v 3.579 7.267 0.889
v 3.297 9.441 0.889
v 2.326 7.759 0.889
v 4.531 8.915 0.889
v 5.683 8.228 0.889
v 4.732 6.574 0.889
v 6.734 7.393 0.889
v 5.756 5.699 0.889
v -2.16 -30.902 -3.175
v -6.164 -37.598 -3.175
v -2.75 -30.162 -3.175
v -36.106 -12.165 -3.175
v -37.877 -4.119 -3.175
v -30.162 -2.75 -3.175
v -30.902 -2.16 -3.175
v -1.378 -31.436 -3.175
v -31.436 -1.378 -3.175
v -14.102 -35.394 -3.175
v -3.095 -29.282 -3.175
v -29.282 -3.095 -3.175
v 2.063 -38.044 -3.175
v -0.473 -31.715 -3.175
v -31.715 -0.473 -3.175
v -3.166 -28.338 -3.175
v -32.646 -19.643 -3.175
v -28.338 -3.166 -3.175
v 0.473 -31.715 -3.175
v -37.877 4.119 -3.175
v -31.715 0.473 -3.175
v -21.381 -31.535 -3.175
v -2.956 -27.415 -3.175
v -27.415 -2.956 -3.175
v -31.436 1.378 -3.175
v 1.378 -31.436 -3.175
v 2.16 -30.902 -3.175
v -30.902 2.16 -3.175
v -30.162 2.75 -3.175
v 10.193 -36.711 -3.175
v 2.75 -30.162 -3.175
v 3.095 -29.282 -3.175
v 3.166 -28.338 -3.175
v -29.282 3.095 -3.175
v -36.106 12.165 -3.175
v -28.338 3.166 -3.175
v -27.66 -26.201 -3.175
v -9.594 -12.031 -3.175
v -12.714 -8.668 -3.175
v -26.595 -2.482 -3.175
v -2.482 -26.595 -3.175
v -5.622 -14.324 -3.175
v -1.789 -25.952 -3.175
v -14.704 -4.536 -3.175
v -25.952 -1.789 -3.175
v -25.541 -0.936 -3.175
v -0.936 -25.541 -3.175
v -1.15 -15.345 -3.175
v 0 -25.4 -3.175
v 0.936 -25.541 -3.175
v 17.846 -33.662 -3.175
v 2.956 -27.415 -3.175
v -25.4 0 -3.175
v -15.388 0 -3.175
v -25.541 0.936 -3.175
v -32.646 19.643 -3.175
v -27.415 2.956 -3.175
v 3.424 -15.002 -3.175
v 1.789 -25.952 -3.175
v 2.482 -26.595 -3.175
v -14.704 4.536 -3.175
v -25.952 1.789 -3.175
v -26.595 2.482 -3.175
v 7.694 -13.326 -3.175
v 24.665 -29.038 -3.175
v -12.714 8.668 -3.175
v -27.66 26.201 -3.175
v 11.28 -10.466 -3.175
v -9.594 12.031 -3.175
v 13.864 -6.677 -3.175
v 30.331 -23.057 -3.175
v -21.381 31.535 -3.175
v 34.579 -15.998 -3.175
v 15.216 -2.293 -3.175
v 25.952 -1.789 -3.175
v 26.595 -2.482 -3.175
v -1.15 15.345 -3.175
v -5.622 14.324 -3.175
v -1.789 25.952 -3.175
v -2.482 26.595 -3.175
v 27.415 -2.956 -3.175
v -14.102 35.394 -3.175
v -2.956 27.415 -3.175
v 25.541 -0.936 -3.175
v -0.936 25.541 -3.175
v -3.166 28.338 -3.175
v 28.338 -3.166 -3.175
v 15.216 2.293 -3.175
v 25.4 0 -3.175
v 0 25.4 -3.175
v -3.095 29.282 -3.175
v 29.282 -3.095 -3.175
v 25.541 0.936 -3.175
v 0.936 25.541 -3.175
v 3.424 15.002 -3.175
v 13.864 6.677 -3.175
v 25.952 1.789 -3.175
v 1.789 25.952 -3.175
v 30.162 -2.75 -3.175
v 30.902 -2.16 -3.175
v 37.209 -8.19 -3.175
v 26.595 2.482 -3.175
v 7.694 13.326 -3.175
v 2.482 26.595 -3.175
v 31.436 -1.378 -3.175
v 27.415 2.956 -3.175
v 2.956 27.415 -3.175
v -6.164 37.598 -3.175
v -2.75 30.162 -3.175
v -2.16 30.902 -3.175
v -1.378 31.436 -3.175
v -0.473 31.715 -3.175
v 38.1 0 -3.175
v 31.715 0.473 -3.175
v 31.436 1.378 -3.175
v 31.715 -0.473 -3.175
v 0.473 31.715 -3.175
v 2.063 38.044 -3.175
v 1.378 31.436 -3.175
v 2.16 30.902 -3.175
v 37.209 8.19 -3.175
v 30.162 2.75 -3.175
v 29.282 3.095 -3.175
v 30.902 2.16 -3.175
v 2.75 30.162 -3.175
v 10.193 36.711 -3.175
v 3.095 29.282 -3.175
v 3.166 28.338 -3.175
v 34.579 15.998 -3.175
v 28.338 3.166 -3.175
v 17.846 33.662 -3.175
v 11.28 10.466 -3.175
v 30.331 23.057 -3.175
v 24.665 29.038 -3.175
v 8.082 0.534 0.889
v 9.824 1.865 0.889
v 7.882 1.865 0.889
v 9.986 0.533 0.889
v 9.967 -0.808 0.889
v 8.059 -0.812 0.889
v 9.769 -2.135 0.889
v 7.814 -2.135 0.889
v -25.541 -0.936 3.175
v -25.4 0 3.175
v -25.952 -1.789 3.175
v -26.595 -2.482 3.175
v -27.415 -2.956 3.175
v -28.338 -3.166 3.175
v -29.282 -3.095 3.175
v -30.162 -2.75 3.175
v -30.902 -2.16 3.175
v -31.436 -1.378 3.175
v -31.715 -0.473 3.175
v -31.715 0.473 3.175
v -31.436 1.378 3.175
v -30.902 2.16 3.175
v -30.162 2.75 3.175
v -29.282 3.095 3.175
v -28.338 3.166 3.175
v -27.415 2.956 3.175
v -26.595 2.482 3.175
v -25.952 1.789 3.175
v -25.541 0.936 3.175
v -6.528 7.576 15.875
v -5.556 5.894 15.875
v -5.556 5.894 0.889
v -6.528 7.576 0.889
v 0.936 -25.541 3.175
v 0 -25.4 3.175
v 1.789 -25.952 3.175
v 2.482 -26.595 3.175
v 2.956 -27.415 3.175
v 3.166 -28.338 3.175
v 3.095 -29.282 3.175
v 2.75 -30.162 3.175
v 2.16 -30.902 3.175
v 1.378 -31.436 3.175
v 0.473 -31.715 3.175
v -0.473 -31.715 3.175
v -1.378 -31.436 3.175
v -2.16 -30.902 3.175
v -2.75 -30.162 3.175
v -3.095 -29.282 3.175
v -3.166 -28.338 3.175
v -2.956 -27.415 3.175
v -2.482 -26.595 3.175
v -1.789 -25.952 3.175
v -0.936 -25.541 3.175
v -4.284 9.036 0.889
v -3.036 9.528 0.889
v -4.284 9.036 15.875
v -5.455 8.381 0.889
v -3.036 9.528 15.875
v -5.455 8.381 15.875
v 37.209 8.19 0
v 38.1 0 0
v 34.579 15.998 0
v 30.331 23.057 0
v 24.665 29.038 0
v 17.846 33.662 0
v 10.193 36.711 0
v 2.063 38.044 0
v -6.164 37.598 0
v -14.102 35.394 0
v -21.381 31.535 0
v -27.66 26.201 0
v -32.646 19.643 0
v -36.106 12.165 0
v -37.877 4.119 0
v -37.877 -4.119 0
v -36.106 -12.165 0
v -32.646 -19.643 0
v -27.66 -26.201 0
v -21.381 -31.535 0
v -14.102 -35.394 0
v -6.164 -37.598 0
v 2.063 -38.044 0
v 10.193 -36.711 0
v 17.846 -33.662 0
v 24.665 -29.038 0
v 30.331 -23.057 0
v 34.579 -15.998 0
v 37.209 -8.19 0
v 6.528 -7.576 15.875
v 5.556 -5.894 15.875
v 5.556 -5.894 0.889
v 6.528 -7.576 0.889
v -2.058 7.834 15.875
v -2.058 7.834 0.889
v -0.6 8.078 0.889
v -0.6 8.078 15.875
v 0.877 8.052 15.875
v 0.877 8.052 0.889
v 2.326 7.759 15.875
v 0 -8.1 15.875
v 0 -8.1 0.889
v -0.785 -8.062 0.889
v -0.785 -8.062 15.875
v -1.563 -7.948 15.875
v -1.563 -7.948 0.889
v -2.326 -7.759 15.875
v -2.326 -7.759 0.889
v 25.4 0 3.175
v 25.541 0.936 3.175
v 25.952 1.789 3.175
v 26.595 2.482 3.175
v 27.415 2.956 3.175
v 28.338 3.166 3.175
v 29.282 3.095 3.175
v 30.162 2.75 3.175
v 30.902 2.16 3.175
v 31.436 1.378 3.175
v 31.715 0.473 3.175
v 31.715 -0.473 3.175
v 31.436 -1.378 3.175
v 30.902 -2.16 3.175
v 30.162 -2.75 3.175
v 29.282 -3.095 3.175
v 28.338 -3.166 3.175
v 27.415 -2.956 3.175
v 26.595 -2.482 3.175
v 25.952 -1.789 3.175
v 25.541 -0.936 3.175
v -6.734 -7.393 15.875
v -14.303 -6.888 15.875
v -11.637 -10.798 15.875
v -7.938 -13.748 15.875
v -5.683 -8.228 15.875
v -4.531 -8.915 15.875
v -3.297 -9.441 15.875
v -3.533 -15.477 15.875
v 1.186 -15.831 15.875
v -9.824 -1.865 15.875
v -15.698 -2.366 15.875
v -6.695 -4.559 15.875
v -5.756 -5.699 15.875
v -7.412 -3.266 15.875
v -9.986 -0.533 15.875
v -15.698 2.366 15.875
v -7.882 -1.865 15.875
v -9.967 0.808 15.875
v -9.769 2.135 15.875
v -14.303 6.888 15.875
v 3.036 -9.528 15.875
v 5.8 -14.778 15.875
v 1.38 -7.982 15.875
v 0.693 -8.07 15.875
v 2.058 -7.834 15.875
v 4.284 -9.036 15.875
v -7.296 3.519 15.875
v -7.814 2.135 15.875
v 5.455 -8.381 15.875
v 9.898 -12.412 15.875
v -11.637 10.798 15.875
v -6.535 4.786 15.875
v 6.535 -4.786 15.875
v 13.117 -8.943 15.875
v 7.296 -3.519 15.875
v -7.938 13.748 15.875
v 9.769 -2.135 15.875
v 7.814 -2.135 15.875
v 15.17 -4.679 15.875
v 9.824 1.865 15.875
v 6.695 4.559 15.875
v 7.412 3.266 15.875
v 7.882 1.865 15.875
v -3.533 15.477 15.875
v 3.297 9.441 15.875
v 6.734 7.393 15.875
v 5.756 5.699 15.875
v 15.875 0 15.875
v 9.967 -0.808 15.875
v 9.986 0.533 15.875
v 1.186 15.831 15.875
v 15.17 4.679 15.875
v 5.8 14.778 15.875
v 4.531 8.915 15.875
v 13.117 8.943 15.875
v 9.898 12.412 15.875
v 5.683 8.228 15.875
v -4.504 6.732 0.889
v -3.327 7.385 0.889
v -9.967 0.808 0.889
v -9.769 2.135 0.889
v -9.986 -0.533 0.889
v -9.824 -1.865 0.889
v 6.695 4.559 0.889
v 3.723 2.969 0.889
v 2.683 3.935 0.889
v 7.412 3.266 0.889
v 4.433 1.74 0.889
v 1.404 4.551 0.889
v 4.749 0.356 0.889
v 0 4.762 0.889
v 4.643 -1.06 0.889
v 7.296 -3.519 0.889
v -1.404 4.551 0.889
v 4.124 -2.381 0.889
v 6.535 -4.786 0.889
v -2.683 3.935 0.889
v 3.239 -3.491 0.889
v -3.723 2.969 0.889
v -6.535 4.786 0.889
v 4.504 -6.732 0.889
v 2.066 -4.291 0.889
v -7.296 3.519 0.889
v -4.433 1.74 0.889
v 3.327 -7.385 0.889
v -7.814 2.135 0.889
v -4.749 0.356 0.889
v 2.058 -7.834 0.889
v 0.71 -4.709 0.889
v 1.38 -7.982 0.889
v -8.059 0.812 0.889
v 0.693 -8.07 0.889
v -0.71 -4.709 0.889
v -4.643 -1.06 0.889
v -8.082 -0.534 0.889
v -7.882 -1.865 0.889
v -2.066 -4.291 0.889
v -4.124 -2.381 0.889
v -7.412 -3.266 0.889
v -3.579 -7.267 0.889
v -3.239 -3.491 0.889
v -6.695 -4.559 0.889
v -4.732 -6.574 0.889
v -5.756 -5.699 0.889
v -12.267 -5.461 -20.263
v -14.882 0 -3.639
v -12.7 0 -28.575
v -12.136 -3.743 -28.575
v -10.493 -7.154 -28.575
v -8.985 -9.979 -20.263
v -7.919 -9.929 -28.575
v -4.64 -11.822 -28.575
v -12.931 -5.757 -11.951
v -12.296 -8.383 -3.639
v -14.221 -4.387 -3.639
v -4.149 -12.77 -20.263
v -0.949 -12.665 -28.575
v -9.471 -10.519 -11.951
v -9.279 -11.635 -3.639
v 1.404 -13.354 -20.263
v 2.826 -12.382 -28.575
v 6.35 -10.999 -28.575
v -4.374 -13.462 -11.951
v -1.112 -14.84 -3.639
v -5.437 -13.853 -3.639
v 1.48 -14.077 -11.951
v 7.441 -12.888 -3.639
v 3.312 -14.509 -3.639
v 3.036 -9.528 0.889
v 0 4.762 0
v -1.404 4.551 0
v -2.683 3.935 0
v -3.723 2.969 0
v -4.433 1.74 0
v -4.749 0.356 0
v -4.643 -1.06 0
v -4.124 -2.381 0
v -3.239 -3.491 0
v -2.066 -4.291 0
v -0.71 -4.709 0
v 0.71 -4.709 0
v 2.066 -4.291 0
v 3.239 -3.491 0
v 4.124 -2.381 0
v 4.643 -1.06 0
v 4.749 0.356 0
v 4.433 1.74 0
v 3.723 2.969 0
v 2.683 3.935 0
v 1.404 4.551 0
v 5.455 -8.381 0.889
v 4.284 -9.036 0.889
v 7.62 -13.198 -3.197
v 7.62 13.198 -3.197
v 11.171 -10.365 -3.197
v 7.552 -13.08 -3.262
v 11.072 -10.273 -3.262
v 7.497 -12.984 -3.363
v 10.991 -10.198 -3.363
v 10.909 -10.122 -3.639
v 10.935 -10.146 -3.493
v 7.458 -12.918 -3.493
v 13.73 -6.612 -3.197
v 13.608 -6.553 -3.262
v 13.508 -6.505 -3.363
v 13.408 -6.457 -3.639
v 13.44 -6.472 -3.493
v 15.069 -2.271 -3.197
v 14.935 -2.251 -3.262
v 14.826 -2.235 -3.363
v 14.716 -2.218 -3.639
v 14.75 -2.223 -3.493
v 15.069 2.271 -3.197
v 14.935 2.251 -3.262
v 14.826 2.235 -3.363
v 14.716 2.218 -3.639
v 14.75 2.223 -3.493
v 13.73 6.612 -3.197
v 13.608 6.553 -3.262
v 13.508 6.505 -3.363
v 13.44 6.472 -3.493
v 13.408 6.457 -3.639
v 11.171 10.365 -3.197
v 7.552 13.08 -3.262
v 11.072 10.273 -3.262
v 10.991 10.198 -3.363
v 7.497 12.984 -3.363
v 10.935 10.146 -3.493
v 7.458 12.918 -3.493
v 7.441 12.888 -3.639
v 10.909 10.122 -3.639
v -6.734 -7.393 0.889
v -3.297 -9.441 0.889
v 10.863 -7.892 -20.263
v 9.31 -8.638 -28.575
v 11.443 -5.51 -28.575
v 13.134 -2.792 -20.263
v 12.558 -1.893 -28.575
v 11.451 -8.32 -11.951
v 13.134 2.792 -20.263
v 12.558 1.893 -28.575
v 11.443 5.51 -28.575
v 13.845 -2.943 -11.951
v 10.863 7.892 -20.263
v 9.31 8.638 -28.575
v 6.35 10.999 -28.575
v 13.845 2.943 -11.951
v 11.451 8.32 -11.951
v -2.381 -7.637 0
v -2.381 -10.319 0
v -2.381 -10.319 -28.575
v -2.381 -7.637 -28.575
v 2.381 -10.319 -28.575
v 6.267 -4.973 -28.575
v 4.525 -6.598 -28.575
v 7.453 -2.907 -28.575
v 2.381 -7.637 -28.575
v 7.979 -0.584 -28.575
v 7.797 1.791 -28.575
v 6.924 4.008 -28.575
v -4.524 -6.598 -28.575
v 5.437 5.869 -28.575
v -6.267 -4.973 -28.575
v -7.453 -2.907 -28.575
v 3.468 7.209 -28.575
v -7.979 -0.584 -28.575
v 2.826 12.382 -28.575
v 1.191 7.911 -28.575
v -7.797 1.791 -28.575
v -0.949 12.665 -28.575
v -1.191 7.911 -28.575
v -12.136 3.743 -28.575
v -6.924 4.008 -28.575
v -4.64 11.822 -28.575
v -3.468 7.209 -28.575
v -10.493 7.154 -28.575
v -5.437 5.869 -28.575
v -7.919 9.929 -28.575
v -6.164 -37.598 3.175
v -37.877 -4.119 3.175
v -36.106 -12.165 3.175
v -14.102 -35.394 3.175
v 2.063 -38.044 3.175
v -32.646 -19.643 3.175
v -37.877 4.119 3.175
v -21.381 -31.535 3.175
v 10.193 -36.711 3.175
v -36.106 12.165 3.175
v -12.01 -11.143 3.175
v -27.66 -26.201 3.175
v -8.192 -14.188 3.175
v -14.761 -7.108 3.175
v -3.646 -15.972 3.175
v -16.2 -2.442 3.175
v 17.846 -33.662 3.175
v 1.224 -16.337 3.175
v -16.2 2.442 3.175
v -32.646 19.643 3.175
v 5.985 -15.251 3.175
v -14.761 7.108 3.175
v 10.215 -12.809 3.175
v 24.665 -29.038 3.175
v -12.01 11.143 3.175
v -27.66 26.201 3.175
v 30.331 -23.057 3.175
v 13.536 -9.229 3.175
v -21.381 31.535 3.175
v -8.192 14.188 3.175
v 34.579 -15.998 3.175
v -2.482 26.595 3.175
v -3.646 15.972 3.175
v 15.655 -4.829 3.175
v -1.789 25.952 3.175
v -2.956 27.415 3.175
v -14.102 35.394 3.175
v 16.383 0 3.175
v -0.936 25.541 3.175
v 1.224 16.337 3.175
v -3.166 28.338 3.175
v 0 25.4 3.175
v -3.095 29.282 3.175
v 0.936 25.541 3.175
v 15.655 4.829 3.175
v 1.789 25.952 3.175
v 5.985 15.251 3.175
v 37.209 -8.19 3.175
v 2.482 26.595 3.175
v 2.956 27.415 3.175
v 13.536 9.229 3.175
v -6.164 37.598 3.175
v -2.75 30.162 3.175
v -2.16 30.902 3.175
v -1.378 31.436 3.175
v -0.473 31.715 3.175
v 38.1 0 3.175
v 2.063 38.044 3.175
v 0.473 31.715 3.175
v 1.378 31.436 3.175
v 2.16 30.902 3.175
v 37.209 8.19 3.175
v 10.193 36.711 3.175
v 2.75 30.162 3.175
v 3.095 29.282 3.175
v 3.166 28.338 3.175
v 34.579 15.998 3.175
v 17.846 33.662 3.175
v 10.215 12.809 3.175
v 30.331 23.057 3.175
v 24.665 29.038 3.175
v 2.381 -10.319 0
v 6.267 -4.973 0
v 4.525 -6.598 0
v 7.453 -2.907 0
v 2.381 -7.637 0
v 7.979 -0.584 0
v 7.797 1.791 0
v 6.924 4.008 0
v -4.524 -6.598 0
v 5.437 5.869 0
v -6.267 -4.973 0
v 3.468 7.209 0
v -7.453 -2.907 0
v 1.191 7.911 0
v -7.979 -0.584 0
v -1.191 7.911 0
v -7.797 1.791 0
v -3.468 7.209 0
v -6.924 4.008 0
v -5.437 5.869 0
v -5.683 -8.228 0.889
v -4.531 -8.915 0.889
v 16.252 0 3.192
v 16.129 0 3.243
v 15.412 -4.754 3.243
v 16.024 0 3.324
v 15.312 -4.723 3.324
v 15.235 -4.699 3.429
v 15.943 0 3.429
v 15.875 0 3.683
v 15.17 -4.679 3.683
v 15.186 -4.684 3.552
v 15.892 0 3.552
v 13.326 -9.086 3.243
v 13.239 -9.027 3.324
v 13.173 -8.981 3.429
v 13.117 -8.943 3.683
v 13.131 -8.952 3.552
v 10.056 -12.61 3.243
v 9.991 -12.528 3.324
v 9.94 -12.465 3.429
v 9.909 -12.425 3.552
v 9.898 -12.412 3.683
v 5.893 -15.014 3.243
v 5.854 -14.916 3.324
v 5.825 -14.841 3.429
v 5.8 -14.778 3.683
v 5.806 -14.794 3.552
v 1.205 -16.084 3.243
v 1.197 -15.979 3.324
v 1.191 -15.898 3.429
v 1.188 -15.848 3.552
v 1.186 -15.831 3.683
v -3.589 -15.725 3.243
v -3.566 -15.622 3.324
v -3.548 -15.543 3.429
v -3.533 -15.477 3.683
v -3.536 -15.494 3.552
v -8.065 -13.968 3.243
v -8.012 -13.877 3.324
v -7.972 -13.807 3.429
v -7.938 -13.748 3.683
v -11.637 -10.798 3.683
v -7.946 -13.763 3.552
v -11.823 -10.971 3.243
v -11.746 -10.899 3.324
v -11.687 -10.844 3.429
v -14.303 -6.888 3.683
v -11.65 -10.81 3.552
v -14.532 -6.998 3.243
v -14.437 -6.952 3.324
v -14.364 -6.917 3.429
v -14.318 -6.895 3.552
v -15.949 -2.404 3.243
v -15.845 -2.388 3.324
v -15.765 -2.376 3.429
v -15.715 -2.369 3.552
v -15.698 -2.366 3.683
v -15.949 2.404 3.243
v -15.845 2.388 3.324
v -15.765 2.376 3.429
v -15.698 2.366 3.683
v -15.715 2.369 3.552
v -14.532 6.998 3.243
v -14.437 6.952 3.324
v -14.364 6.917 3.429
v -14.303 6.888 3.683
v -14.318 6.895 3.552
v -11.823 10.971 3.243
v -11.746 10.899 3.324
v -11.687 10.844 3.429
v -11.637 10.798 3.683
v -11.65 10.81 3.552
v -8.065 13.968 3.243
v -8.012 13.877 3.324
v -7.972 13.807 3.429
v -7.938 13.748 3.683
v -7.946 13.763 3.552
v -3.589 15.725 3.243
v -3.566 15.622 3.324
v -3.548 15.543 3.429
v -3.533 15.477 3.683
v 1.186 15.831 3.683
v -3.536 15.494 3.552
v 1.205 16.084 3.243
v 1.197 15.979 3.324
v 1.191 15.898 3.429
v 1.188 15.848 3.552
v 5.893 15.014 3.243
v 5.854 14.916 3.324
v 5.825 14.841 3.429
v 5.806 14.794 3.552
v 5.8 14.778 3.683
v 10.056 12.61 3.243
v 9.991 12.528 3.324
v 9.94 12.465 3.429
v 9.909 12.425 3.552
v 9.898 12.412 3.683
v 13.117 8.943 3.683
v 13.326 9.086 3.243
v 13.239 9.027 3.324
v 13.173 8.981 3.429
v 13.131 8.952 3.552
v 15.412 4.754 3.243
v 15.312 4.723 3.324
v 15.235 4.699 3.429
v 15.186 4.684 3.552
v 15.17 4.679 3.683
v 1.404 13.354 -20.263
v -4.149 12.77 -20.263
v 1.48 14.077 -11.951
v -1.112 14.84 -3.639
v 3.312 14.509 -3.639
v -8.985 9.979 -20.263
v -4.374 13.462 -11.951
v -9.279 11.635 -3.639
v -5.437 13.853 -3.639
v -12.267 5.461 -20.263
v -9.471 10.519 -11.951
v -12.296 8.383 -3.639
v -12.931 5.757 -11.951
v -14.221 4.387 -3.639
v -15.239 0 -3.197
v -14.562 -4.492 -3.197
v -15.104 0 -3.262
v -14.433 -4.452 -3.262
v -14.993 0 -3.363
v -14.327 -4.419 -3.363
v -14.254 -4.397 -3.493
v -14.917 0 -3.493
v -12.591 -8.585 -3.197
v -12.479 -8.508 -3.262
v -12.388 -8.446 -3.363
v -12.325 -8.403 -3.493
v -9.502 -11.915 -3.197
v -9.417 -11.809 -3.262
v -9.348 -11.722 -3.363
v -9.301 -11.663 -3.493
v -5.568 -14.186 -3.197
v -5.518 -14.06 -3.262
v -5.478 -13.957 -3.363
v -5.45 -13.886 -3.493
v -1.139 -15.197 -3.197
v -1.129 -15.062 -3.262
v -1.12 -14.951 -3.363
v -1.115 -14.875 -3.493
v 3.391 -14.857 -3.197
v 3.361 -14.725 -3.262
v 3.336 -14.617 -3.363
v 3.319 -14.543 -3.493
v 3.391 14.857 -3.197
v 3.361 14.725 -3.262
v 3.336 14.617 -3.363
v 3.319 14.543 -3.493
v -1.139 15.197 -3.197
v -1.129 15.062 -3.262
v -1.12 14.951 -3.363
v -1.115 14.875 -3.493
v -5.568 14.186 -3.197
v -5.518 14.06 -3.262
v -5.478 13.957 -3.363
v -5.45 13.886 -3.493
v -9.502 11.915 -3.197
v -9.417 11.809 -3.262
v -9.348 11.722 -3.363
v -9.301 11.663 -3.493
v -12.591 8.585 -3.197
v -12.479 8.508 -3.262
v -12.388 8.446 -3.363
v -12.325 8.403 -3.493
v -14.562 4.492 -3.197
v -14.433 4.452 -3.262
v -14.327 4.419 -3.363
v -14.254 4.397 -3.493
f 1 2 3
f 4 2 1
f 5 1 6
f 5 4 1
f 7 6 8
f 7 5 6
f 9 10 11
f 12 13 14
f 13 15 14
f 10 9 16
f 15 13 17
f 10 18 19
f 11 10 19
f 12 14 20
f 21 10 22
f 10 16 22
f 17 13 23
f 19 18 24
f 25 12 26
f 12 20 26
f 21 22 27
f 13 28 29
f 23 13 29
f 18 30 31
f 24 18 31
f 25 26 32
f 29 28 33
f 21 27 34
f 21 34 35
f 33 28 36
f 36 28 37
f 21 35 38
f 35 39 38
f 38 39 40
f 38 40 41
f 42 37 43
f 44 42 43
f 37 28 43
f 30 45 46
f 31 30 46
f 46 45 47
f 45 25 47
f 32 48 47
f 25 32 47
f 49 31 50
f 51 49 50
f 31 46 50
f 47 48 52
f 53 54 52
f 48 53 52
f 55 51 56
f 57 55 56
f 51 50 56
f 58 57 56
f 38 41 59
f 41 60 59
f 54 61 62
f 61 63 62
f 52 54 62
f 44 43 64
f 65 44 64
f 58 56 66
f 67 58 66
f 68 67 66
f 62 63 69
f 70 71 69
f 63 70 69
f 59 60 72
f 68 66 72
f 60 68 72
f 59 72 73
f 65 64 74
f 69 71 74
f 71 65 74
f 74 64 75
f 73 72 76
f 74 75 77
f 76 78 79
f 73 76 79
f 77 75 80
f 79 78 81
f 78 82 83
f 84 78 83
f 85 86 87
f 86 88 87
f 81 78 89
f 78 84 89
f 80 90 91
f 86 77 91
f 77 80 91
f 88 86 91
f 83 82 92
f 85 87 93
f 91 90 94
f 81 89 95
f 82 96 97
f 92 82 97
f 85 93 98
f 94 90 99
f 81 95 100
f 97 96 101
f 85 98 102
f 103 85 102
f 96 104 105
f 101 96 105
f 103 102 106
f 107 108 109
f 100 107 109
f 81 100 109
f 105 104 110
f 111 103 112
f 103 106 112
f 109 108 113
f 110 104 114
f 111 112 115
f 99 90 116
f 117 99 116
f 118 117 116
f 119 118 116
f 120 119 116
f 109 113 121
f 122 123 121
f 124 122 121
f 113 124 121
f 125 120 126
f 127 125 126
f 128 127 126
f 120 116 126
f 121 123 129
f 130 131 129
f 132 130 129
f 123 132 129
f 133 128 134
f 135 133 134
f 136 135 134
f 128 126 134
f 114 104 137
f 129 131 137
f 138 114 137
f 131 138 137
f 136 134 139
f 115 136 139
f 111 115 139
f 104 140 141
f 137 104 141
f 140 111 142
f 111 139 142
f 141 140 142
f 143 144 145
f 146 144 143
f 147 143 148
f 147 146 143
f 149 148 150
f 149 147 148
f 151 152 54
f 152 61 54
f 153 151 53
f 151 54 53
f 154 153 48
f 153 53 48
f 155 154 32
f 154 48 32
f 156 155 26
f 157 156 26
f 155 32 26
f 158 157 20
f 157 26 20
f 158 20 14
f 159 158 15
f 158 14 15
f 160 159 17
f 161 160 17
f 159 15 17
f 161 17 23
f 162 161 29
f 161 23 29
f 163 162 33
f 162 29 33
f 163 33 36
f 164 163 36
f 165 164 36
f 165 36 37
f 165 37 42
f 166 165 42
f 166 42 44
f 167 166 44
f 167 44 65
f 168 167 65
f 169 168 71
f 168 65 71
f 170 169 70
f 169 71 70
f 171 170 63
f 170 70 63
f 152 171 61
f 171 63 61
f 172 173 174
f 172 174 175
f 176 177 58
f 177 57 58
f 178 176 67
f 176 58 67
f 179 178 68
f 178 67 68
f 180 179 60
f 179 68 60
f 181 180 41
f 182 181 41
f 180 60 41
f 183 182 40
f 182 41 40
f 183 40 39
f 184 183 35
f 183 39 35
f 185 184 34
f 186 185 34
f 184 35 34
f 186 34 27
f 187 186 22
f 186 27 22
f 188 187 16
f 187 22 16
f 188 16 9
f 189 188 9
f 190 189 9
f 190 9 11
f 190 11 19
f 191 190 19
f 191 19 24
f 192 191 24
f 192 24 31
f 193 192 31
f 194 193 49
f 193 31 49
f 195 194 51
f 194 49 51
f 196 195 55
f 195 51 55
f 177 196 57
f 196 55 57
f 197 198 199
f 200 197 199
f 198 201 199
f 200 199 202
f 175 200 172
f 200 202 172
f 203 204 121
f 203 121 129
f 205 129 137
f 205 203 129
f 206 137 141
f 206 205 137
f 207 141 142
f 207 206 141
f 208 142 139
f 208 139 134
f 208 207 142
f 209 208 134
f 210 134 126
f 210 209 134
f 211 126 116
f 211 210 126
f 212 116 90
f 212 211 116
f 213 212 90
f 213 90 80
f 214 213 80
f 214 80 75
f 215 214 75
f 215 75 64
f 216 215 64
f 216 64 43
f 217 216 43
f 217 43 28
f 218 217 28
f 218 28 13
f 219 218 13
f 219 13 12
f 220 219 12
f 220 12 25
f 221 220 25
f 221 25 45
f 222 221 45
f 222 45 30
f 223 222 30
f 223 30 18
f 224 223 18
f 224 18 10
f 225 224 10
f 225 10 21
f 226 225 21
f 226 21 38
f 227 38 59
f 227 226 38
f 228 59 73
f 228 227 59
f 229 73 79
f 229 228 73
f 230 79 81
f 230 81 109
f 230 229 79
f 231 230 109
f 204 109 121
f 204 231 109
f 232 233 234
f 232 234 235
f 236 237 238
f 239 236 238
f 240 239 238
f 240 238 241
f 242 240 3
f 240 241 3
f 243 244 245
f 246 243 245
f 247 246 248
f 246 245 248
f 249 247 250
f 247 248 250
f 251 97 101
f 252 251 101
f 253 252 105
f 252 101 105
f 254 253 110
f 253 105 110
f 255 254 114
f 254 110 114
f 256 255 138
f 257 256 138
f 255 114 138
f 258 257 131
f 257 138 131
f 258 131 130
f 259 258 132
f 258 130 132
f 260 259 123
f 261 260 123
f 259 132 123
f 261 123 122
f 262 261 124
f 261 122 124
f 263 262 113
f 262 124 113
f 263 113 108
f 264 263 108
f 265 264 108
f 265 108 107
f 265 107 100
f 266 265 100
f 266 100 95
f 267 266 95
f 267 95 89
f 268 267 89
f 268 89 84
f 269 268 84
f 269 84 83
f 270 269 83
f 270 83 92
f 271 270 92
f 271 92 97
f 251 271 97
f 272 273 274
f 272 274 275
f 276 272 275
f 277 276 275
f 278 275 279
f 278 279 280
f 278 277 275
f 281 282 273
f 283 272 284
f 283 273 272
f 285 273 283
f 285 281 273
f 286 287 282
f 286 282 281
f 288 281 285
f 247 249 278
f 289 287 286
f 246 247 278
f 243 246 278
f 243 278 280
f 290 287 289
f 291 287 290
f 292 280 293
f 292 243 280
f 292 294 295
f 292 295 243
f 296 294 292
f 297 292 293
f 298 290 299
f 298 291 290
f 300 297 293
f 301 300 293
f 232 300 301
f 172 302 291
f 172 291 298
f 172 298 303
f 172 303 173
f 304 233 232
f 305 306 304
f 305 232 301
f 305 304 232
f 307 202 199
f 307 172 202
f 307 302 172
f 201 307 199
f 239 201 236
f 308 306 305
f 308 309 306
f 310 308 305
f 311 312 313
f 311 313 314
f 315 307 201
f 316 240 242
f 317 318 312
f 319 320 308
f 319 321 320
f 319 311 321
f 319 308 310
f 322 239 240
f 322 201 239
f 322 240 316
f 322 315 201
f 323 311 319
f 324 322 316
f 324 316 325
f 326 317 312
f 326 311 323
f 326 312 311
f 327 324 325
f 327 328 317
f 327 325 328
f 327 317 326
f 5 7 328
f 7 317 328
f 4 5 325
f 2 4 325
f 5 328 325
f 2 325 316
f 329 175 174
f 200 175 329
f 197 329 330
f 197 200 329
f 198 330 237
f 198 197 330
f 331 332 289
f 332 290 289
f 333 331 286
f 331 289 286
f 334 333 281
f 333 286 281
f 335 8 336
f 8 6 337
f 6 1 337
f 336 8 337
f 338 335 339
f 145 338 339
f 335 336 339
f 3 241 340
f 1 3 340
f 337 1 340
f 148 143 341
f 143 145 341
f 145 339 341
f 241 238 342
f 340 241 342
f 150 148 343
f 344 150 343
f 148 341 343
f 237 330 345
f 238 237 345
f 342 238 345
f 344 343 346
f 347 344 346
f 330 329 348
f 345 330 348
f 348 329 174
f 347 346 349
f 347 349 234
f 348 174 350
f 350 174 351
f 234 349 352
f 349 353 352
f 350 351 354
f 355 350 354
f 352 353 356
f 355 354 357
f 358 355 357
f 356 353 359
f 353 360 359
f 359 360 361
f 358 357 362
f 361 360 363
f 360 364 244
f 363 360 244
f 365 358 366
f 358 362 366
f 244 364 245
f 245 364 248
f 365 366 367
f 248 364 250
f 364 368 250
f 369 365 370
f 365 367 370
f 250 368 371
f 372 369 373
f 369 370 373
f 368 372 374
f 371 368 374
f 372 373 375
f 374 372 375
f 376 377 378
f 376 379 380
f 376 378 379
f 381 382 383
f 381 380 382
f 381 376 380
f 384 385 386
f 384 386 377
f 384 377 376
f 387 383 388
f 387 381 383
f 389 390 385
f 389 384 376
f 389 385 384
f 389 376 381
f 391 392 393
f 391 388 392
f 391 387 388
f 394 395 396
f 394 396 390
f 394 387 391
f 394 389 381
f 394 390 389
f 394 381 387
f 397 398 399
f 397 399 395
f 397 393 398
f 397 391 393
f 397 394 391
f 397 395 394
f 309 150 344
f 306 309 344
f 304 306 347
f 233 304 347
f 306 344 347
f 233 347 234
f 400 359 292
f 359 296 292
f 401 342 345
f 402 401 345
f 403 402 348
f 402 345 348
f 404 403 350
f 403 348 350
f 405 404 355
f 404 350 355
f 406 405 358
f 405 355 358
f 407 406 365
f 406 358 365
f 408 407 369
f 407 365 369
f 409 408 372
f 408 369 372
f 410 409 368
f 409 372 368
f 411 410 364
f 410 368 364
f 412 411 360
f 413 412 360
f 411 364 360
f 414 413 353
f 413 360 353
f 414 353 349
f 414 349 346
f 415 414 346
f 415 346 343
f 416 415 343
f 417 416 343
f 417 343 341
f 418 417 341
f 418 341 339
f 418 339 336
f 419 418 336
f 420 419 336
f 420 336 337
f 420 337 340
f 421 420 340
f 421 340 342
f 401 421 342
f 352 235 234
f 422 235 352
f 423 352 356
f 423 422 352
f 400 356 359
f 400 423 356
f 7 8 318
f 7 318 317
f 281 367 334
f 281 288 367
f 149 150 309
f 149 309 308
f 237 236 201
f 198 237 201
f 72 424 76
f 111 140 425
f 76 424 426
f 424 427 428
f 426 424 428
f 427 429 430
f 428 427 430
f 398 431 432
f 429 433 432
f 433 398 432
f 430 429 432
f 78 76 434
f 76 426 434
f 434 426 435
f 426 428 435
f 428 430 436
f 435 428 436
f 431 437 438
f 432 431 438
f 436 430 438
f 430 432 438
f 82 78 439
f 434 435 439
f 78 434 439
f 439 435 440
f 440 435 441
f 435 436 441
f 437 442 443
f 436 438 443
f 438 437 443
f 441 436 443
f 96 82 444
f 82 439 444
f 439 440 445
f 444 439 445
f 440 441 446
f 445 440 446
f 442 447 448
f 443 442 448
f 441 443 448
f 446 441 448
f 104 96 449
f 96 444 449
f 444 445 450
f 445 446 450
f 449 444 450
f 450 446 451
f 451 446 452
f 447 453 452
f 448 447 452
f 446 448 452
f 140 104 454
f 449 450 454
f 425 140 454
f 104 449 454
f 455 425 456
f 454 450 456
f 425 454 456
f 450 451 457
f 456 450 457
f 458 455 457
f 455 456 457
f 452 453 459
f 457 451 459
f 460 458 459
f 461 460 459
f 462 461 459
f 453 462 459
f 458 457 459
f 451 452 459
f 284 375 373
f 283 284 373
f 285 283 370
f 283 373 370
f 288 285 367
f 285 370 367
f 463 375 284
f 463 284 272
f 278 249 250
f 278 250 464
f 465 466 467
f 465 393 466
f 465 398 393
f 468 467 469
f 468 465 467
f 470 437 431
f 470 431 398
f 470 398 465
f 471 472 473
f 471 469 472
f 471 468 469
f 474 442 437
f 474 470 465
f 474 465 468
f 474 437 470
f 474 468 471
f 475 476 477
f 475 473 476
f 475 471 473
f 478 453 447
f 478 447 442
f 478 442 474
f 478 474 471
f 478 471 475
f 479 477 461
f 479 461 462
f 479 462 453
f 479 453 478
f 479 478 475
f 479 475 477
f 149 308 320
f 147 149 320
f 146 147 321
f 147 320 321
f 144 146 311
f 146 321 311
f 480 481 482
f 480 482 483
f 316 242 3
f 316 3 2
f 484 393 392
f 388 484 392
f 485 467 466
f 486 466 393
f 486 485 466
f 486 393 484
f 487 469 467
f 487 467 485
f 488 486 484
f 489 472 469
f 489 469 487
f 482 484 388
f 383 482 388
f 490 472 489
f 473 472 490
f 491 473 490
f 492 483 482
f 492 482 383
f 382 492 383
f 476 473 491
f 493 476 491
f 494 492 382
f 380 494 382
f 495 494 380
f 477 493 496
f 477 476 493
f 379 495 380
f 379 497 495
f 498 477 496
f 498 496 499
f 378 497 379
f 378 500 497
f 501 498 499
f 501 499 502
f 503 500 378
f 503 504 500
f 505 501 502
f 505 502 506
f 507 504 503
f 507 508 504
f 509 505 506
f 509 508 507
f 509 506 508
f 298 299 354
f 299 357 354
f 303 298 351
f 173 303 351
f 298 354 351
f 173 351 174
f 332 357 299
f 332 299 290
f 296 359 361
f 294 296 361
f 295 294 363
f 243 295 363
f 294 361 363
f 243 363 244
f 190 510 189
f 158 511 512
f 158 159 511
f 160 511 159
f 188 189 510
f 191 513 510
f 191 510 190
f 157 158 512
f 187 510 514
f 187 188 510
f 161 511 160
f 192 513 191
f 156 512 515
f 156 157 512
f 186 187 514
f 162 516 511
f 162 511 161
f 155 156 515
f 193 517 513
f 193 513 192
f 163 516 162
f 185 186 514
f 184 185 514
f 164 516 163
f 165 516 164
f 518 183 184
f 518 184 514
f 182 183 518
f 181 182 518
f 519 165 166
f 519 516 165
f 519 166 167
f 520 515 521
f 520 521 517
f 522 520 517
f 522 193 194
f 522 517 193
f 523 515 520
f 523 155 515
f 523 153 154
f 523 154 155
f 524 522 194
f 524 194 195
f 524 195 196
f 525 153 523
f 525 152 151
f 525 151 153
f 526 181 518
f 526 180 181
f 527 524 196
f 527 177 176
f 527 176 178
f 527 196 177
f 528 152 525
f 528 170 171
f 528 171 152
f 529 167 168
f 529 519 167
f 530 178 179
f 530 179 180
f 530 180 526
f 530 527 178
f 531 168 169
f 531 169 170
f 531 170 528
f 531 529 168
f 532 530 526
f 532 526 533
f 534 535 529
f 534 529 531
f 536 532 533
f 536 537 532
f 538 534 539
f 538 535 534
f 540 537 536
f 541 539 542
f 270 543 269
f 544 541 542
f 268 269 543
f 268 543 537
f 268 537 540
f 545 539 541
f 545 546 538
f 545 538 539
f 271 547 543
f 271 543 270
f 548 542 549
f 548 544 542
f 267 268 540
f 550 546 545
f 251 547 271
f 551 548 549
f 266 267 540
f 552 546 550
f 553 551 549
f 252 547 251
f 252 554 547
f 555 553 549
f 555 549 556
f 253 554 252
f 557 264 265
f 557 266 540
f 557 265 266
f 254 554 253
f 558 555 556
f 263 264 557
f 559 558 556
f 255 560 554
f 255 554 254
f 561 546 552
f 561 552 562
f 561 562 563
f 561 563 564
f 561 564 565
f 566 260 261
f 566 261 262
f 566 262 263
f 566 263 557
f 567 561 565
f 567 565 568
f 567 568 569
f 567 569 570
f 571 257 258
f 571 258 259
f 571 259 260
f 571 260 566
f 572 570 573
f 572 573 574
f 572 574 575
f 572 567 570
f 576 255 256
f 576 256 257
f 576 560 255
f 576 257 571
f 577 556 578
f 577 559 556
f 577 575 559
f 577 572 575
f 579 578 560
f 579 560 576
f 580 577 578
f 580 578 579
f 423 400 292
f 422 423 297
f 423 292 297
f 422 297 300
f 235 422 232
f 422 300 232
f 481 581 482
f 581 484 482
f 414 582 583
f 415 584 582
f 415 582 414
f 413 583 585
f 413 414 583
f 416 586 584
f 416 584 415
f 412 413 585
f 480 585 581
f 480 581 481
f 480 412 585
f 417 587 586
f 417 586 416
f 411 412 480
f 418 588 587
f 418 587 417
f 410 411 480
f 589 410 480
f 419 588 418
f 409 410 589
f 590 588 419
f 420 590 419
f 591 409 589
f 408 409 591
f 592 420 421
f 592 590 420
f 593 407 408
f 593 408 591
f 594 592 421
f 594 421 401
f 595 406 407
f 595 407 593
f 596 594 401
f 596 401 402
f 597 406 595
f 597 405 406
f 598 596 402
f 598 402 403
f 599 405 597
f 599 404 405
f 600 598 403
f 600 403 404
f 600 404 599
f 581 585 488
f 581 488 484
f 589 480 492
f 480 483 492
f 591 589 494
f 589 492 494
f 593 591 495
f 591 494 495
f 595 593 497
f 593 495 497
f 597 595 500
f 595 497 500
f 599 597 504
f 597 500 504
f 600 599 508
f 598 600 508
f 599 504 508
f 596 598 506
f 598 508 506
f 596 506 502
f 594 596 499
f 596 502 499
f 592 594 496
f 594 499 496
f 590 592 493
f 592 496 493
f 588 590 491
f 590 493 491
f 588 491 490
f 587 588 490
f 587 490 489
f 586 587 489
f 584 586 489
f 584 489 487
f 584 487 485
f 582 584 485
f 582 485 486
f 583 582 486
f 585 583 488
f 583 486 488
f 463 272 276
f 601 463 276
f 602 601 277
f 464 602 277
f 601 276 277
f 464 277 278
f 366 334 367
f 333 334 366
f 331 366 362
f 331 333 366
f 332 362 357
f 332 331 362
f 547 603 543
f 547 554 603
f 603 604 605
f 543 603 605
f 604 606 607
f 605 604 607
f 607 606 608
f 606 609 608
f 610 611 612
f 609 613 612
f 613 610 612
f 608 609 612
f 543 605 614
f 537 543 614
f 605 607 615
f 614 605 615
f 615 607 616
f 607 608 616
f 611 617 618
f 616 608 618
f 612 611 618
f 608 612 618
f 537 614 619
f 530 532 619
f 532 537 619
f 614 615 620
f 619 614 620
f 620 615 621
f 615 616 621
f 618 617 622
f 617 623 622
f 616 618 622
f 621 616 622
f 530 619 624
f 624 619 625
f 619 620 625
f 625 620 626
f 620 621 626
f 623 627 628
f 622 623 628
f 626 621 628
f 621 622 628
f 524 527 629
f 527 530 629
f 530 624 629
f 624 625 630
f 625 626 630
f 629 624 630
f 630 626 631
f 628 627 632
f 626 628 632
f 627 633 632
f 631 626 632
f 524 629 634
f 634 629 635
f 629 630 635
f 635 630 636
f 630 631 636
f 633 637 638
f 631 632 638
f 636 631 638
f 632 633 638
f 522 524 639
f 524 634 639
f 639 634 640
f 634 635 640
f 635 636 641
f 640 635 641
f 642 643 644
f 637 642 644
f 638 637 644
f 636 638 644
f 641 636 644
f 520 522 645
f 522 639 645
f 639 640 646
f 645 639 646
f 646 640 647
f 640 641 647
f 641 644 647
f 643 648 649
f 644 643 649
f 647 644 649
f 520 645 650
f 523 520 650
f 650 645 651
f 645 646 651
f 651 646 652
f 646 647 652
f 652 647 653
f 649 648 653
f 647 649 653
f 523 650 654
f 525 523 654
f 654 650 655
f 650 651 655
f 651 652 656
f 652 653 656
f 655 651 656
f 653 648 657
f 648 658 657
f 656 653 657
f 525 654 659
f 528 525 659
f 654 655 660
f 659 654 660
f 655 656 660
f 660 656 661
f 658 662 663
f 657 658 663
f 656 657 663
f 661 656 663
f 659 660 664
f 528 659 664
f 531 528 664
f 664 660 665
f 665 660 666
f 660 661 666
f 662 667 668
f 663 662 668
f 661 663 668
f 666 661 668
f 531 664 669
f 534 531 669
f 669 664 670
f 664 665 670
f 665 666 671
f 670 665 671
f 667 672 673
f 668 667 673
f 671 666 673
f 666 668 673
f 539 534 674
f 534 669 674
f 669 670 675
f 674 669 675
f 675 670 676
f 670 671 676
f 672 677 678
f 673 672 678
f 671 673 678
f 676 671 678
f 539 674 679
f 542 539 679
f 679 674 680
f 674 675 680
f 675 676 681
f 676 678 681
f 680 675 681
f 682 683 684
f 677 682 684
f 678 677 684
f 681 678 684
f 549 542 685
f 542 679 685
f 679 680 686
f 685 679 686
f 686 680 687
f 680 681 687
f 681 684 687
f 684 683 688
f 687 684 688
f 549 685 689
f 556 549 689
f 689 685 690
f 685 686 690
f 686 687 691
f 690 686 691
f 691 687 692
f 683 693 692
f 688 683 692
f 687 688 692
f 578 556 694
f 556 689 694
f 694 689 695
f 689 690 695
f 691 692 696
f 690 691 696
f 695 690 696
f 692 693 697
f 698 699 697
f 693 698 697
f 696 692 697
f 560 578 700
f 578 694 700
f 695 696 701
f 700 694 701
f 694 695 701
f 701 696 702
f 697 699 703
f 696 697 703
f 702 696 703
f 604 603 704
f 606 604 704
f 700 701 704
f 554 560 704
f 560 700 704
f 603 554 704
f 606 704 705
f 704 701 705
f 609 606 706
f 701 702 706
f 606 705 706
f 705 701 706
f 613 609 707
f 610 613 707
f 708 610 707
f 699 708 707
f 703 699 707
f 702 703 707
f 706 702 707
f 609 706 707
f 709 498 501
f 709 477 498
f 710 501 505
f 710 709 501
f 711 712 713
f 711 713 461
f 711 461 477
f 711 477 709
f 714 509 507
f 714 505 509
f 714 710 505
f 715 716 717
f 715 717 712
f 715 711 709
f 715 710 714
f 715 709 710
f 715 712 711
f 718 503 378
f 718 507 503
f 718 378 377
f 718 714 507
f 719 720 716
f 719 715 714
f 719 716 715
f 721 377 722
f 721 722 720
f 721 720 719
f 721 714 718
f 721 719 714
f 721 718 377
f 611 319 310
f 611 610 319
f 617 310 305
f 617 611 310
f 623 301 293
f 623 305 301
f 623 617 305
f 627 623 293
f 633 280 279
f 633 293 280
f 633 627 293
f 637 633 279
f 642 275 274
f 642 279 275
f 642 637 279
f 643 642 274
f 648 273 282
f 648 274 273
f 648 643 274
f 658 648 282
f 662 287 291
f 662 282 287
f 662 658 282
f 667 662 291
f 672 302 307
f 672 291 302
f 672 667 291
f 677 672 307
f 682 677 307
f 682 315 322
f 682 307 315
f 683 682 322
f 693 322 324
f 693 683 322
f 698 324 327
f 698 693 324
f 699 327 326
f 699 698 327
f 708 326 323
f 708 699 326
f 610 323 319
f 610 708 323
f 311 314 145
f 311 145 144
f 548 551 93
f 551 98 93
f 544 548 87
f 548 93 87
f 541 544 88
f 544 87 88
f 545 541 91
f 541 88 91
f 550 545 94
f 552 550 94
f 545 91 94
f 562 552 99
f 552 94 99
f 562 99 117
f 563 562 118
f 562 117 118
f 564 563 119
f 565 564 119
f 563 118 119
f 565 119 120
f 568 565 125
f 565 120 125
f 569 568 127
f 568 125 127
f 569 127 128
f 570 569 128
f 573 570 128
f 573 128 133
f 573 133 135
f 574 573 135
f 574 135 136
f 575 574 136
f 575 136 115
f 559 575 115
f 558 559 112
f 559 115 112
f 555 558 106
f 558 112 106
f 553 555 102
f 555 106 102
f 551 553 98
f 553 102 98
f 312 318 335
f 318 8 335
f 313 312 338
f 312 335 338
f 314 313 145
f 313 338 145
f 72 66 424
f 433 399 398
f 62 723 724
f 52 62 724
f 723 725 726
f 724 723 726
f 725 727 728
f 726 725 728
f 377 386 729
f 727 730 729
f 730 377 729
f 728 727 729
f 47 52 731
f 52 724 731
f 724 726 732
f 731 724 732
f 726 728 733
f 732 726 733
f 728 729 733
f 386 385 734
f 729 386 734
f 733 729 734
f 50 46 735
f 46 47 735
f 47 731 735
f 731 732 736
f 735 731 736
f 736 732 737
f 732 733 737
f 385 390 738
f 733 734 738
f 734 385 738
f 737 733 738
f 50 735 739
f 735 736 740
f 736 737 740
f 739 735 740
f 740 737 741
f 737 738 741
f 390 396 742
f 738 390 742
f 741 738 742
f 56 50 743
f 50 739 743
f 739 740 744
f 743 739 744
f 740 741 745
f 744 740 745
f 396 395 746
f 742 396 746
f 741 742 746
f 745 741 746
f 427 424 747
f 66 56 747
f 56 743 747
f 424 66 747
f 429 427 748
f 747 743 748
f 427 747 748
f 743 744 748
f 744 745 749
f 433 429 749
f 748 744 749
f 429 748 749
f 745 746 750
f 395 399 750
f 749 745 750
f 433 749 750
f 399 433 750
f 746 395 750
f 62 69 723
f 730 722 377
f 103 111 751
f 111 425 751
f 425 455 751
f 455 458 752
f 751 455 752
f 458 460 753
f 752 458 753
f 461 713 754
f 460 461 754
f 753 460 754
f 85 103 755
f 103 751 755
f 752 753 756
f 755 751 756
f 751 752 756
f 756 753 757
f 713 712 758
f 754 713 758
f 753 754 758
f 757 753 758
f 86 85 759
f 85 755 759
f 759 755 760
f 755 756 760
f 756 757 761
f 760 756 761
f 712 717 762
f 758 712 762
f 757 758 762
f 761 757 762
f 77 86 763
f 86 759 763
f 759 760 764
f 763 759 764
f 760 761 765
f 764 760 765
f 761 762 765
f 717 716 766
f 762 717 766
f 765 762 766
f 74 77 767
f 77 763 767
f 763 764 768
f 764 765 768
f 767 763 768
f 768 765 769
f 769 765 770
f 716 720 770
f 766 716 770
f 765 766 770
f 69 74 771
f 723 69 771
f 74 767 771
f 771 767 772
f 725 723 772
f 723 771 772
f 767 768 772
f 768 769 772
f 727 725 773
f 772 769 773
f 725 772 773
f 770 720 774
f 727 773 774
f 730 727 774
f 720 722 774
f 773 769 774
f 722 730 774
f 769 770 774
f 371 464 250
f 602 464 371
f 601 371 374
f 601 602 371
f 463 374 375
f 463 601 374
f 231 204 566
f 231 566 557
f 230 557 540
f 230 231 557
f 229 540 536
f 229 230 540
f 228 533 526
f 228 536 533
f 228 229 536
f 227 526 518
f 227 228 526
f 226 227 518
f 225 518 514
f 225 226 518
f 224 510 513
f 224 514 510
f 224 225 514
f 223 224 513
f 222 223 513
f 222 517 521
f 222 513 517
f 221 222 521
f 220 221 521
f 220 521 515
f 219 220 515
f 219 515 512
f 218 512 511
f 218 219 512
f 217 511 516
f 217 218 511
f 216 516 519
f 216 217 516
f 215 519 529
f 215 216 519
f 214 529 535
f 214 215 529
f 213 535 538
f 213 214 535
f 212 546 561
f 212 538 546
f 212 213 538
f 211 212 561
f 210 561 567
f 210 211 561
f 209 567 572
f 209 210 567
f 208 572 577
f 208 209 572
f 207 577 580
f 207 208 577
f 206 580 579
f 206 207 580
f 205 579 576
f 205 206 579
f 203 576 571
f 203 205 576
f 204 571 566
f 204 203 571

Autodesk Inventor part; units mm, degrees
ref_plane "YZ Plane" through (0, 0, 0) normal (1, 0, 0) x (0, 1, 0)
ref_plane "XZ Plane" through (0, 0, 0) normal (0, 1, 0) x (-1, 0, 0)
ref_plane "XY Plane" through (0, 0, 0) normal (0, 0, 1) x (1, 0, 0)
sketch "Sketch1" plane through (0, 0, 0) normal (0, 0, 1) x (1, 0, 0)
  circle A0 centre (0, 0) radius 38.1
  dimension "d2" = 76.2
extrude "Extrusion1" add sketch "Sketch1" along normal mid plane 6.35
sketch "Sketch2" plane through (0, 0, 3.175) normal (0, 0, 1) x (1, 0, 0)
  circle A0 centre (0, 0) radius 38.1 projected
  point P0 (0, 28.575)
  dimension "d3" = 0
  dimension "d4" = 28.575
hole "Mounting Hole" at (0, 28.575, 3.175) direction (0, 0, -1) diameter 6.35 end through all
pattern_circular "Circular Pattern1" count 4 over 360 about axis through (0, 0, 0) along (0, 0, 1) of "Mounting Hole"
sketch "Sketch3" plane through (0, 0, 3.175) normal (0, 0, 1) x (1, 0, 0)
  circle A0 centre (0, 0) radius 38.1 projected
  circle A1 centre (0, 0) radius 15.875
  dimension "d15" = 31.75
extrude "Extrusion2" add sketch "Sketch3" along normal blind 12.7 contours A1
sketch "Sketch8" plane through (0, 0, 15.875) normal (0, 0, 1) x (1, 0, 0)
  circle A0 centre (0, 0) radius 15.875 projected
hole "Hole3" at (0, 0, 15.875) direction (0, 0, -1) diameter 16.2 depth 14.986
sketch "Sketch4" plane through (0, 0, 15.875) normal (0, 0, 1) x (1, 0, 0)
  arc A0 (-3.0359, 9.528) -> (-6.5275, 7.5757) centre (0, 0) ccw
  circle A1 centre (0, 0) radius 15.875 projected
  line L0 (0, 0) -> (-5, 8.6603) construction
  line L1 (0, 0) -> (-10.16, 0) construction
  line L2 (-2.058, 7.8342) -> (-3.0359, 9.528)
  line L3 (-5.5564, 5.8937) -> (-6.5275, 7.5757)
  arc A2 (-2.058, 7.8342) -> (-5.5564, 5.8937) centre (0, 0) ccw
  circle A3 centre (0, 0) radius 8.1 projected
  dimension "d46" = 60
  dimension "d47" = 4
  dimension "d48" = 20
extrude "Extrusion3" cut sketch "Sketch4" against normal up to surface (14.986 mm away) contours L2 A2 L3 A0
pattern_circular "Circular Pattern2" count 6 over 360 about axis through (0, 0, 0) along (0, 0, 1) of "Extrusion3"
sketch "Sketch5" plane through (0, 0, -3.175) normal (0, 0, -1) x (-1, 0, 0)
  circle A0 centre (0, 0) radius 38.1 projected
  circle A1 centre (0, 0) radius 14.9225
  dimension "d27" = 29.845
extrude "Extrusion4" add sketch "Sketch5" along normal blind 25.4 draft -5 contours A1
sketch "Sketch6" plane through (0, 0, -28.575) normal (0, 0, -1) x (-1, 0, 0)
  circle A0 centre (0, 0) radius 12.7003 projected
  arc A1 (2.3812, -7.6374) -> (-2.3813, -7.6374) centre (0, 0) ccw
  line L0 (-2.3813, -7.6374) -> (-2.3812, -10.3188)
  line L1 (-2.3812, -10.3188) -> (2.3813, -10.3188)
  line L2 (2.3813, -10.3188) -> (2.3812, -7.6374)
  dimension "d31" = 16
  dimension "d32" = 4.7625
  dimension "d33" = 10.3187
extrude "Extrusion5" cut sketch "Sketch6" against normal blind 28.575 contours L2 L1 L0 A1
sketch "Sketch7" plane through (0, 0, 0) normal (0, 0, -1) x (-1, 0, 0)
  arc A0 (2.3812, -7.6374) -> (-2.3813, -7.6374) centre (0, 0) ccw projected
  point P0 (0, 0)
hole "Hole2" at (0, 0, 0) direction (0, 0, 1) diameter 9.525 end through all
fillet "Fillet1" radius 0.508 2 edges at (14.9225, 0, -3.175) (-15.875, 0, 3.175)
properties part number "Nippon-Denso Gear Coupler" material "ABS Plastic"
